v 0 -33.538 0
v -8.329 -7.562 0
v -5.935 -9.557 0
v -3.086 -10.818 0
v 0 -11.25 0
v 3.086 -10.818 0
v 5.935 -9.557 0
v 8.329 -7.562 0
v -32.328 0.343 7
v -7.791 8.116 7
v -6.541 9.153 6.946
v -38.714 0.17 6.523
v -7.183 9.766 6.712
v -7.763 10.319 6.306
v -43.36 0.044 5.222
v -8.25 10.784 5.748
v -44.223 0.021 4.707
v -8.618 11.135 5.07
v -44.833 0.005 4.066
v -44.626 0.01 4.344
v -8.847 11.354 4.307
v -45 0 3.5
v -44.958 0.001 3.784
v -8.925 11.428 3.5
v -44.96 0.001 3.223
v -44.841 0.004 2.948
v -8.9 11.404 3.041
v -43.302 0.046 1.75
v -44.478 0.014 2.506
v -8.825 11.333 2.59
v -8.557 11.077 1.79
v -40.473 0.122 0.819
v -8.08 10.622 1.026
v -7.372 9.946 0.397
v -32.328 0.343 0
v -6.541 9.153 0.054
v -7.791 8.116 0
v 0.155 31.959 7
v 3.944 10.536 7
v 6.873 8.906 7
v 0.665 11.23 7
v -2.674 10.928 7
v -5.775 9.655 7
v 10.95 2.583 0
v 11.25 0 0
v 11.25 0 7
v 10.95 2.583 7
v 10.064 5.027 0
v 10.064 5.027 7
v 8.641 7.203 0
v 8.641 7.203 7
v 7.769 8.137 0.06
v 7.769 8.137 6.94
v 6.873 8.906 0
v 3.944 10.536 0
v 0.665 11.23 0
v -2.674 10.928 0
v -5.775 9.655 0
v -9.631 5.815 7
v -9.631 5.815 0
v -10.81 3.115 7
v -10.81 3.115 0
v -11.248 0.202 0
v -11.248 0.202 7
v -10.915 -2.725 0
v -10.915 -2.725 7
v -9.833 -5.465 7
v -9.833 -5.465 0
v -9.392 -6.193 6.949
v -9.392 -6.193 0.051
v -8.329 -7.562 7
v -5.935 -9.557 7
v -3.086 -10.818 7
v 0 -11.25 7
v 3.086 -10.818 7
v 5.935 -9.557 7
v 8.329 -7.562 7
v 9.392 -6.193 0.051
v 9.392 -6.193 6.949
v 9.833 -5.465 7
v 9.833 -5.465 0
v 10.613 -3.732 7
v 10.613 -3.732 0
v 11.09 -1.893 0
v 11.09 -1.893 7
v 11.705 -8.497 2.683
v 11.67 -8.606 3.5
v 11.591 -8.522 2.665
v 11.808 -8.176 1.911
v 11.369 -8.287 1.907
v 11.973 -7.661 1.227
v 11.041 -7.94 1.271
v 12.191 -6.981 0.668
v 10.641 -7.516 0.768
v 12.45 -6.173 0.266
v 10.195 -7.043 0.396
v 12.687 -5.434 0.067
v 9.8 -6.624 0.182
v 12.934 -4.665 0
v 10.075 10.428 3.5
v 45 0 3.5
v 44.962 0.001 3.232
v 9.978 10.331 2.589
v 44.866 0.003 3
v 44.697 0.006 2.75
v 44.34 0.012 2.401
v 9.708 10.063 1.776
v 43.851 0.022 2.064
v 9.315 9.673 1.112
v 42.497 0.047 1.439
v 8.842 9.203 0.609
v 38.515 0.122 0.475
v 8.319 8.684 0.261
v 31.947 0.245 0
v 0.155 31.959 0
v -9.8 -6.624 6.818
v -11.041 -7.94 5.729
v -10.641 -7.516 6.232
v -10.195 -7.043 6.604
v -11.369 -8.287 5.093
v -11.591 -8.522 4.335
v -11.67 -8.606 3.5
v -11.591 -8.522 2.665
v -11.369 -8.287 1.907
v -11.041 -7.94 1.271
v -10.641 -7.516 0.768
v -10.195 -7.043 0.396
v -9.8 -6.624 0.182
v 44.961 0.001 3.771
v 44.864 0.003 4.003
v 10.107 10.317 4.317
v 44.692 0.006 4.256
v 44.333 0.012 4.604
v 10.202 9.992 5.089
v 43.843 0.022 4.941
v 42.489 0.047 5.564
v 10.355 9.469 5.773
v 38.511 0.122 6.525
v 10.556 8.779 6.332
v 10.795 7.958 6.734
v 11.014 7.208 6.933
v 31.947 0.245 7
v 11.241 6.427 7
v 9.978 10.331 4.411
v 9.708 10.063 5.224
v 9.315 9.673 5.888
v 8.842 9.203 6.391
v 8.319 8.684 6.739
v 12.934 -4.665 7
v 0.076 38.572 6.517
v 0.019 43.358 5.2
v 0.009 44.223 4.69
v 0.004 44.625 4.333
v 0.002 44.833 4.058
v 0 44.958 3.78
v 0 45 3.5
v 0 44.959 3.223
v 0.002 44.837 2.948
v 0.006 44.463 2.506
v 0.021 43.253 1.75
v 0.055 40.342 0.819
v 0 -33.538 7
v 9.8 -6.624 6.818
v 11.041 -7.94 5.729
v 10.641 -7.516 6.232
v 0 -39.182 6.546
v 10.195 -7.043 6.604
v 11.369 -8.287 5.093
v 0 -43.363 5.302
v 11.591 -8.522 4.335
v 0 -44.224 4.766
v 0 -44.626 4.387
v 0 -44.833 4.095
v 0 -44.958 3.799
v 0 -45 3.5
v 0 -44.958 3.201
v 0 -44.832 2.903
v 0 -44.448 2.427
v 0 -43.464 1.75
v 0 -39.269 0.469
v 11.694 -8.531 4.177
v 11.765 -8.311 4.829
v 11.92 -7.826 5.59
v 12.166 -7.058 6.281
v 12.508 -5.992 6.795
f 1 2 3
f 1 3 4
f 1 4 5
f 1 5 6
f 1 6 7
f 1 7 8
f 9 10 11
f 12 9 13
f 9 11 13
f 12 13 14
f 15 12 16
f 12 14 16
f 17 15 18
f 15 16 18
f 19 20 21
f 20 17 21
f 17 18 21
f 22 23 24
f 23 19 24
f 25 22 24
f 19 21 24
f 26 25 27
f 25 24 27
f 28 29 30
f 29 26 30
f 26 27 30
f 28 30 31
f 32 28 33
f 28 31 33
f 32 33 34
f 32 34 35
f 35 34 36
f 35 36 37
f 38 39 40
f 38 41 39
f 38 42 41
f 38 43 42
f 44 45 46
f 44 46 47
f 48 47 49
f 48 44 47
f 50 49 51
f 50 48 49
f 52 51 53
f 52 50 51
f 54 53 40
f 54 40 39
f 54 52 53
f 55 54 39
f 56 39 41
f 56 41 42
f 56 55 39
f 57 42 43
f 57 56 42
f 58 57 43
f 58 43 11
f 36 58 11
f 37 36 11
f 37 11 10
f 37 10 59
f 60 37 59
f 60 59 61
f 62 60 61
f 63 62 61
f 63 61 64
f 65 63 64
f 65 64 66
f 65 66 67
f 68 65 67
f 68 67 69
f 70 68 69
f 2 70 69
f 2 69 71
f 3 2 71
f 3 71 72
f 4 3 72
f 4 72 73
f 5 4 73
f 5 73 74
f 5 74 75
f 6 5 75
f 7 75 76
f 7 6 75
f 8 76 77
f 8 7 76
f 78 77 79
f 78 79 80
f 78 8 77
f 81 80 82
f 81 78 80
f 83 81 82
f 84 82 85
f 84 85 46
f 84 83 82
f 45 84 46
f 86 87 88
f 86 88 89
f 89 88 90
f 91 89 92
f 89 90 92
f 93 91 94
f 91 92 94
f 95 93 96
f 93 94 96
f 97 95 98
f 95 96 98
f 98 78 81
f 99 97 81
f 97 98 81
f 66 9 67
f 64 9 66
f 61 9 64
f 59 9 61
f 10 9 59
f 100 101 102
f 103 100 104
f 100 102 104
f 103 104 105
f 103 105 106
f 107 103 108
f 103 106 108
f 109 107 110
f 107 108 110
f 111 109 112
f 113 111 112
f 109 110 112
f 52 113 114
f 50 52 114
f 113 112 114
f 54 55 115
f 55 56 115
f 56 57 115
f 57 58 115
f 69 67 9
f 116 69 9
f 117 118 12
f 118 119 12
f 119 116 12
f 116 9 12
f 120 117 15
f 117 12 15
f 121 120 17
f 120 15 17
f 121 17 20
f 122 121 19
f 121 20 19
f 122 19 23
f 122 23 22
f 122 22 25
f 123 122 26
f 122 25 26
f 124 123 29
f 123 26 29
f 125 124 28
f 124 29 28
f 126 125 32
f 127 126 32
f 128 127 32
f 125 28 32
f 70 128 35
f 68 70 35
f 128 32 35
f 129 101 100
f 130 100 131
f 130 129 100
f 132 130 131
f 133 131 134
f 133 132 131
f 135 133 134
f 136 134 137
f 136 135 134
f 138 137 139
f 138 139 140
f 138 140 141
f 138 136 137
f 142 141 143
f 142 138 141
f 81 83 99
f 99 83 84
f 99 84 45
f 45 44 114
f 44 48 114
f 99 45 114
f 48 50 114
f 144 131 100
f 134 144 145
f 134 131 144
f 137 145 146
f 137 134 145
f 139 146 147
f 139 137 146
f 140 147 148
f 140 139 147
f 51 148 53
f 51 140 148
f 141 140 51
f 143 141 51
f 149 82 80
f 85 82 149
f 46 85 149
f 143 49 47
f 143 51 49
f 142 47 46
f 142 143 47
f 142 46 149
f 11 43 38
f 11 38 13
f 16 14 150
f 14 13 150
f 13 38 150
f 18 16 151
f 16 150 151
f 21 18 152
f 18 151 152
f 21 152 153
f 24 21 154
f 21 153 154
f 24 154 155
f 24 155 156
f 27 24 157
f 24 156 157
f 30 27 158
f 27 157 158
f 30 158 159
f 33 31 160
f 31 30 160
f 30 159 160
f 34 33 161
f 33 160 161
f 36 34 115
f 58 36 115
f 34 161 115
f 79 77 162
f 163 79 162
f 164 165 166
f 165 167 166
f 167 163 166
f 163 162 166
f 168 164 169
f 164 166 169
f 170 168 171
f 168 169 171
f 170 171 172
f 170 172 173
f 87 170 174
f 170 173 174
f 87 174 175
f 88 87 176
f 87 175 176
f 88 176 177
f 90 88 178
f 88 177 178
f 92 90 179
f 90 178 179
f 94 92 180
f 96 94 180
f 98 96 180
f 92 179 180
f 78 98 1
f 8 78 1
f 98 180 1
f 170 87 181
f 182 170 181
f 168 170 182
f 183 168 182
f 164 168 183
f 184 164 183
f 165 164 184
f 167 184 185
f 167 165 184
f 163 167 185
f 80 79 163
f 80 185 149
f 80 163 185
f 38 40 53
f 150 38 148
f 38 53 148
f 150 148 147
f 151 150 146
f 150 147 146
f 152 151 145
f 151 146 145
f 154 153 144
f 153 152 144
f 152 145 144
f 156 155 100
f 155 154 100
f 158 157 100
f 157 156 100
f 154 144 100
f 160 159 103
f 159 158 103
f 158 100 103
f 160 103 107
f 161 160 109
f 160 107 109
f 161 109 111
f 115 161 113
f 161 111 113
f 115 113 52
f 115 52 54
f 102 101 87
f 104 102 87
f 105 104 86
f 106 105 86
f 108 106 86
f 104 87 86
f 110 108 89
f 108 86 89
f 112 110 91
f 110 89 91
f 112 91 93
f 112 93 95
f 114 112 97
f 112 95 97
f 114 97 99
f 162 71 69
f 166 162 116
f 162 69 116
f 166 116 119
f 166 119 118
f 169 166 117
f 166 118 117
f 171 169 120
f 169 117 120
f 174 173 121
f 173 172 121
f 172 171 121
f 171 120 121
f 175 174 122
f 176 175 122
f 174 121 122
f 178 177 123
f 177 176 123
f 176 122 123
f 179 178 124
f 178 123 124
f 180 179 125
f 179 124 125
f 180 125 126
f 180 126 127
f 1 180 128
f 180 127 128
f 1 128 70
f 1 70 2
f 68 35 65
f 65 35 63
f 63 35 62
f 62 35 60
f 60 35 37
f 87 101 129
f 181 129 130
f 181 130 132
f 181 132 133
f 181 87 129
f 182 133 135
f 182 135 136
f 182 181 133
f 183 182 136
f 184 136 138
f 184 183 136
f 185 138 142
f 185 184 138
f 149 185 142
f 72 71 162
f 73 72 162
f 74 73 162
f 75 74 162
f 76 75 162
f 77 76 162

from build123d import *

# Parameters (mm, degrees)
F0_R         = 11.25
F1_DEPTH     = 7
F2_T4_DEPTH  = 53.5102509631
F2_T9_DEPTH  = 52.2381371755
F2_T14_DEPTH = 55.3419579342
F2_T19_DEPTH = 51.9229754131
F2_T24_DEPTH = 55.7195375849
F2_T29_DEPTH = 55.7195375849
F2_T34_DEPTH = 51.9229754131
F2_T39_DEPTH = 53.9484048993
F2_T45_DEPTH = 53.9484048993
F2_T49_DEPTH = 53.5102509631
F2_T56_DEPTH = 52.2381371755
F2_T60_DEPTH = 55.3419579342
F2_T67_DEPTH = 55.7195375849
F2_T71_DEPTH = 51.9229754131
F2_T78_DEPTH = 55.7195375849
F2_T82_DEPTH = 51.9229754131
F3_T4_DEPTH  = 53.5102509631
F3_T9_DEPTH  = 53.9484048993
F3_T14_DEPTH = 51.9229754131
F3_T19_DEPTH = 55.7195375849
F3_T24_DEPTH = 55.7195375849
F3_T29_DEPTH = 51.9229754131
F3_T34_DEPTH = 55.3419579342
F3_T39_DEPTH = 52.2381371755
F3_T45_DEPTH = 53.5102509631
F3_T49_DEPTH = 53.9484048993
F3_T56_DEPTH = 51.9229754131
F3_T60_DEPTH = 55.7195375849
F3_T67_DEPTH = 55.7195375849
F3_T71_DEPTH = 51.9229754131
F3_T78_DEPTH = 55.3419579342
F3_T82_DEPTH = 52.2381371755


# Not quite as in the source:
# - a fillet or chamfer that OpenCascade refuses, or shapes differently, is made with other operations: its cross-section is extruded or revolved along the edge and cut away or added


with BuildPart() as f1:
    # F0 (on Top) → F1 (new body)
    with BuildSketch(Plane.XY):
        with BuildLine():
            ThreePointArc((11.6700973746, -8.6057438533), (13.7743677156, -4.5295467802), (14.5, 0))
            ThreePointArc((14.5, 0), (13.3480283218, 5.6639332553), (10.0751531144, 10.4279091731))
            ThreePointArc((10.0751531144, 10.4279091731), (0.7621030803, 14.4799585253), (-8.9248468856, 11.4279091731))
            ThreePointArc((-8.9248468856, 11.4279091731), (-14.3657490464, 1.9685665686), (-11.6700973746, -8.6057438533))
            ThreePointArc((-11.6700973746, -8.6057438533), (0, -14.5), (11.6700973746, -8.6057438533))
        make_face()
        Circle(F0_R, mode=Mode.SUBTRACT)
        with BuildLine():
            ThreePointArc((10.0751531144, 10.4279091731), (13.3480283218, 5.6639332553), (14.5, 0))
            ThreePointArc((14.5, 0), (13.7743677156, -4.5295467802), (11.6700973746, -8.6057438533))
            Line((11.6700973746, -8.6057438533), (45, 0))
            Line((45, 0), (10.0751531144, 10.4279091731))
        make_face()
        with BuildLine():
            ThreePointArc((-8.9248468856, 11.4279091731), (0.7621030803, 14.4799585253), (10.0751531144, 10.4279091731))
            Line((10.0751531144, 10.4279091731), (0, 45))
            Line((0, 45), (-8.9248468856, 11.4279091731))
        make_face()
        with BuildLine():
            Line((0, -45), (11.6700973746, -8.6057438533))
            ThreePointArc((11.6700973746, -8.6057438533), (0, -14.5), (-11.6700973746, -8.6057438533))
            Line((-11.6700973746, -8.6057438533), (0, -45))
        make_face()
        with BuildLine():
            ThreePointArc((-11.6700973746, -8.6057438533), (-14.3657490464, 1.9685665686), (-8.9248468856, 11.4279091731))
            Line((-8.9248468856, 11.4279091731), (-45, 0))
            Line((-45, 0), (-11.6700973746, -8.6057438533))
        make_face()
    extrude(amount=F1_DEPTH)

    # F2: fillet of radius 3.5 on 8 edges, made by hand


with BuildPart() as f2_tool2:
    # F2_s3 → F2_t4 (new body)
    with BuildSketch(Plane(origin=(0.4357492619, -1.4952391183, 0), x_dir=(0, 0, 1), z_dir=(-0.2797856956, 0.9600624795, 0))):
        with BuildLine():
            ThreePointArc((3.5, 12.5903563019), (5.9748737342, 11.5652300361), (7, 9.0903563019))
            Line((7, 9.0903563019), (7, 12.5903563019))
            Line((7, 12.5903563019), (3.5, 12.5903563019))
        make_face()
    extrude(amount=F2_T4_DEPTH)

    split(bisect_by=Plane(origin=(3.6834089544, 12.3363650004, 0), x_dir=(0, 0, 1), z_dir=(0.2861005633, 0.958199597, 0)), keep=Keep.TOP)


with BuildPart() as f1_1:
    add(f1.part)

    # F2_t1: cut F2_tool2
    add(f2_tool2.part, mode=Mode.SUBTRACT)


with BuildPart() as f2_tool7:
    # F2_s8 → F2_t9 (new body)
    with BuildSketch(Plane(origin=(13.4212581193, 50.4859861874, 0), x_dir=(0, 0, 1), z_dir=(-0.2569178318, -0.9664332505, 0))):
        with BuildLine():
            ThreePointArc((3.5, 11.5613024332), (5.9748737342, 10.5361761674), (7, 8.0613024332))
            Line((7, 8.0613024332), (7, 11.5613024332))
            Line((7, 11.5613024332), (3.5, 11.5613024332))
        make_face()
    extrude(amount=F2_T9_DEPTH)

    split(bisect_by=Plane(origin=(-4.1039199091, 12.9550853833, 0), x_dir=(0, 0, 1), z_dir=(-0.3019904306, 0.9533109565, 0)), keep=Keep.TOP)


with BuildPart() as f1_2:
    add(f1_1.part)

    # F2_t6: cut F2_tool7
    add(f2_tool7.part, mode=Mode.SUBTRACT)


with BuildPart() as f2_tool12:
    # F2_s13 → F2_t14 (new body)
    with BuildSketch(Plane(origin=(3.5205438929, 1.1152400579, 0), x_dir=(0, 0, 1), z_dir=(-0.9533109565, -0.3019904306, 0))):
        with BuildLine():
            ThreePointArc((3.5, 13.5895693791), (5.9748737342, 12.5644431133), (7, 10.0895693791))
            Line((7, 10.0895693791), (7, 13.5895693791))
            Line((7, 13.5895693791), (3.5, 13.5895693791))
        make_face()
    extrude(amount=F2_T14_DEPTH)

    split(bisect_by=Plane(origin=(-11.1732270906, 2.9703047545, 0), x_dir=(0, 0, 1), z_dir=(-0.9664332505, 0.2569178318, 0)), keep=Keep.TOP)


with BuildPart() as f1_3:
    add(f1_2.part)

    # F2_t11: cut F2_tool12
    add(f2_tool12.part, mode=Mode.SUBTRACT)


with BuildPart() as f2_tool17:
    # F2_s18 → F2_t19 (new body)
    with BuildSketch(Plane(origin=(-50.6596510698, 13.0802656612, 0), x_dir=(0, 0, 1), z_dir=(0.9682458366, -0.25, 0))):
        with BuildLine():
            ThreePointArc((3.5, 11.25), (5.9748737342, 10.2248737342), (7, 7.75))
            Line((7, 7.75), (7, 11.25))
            Line((7, 11.25), (3.5, 11.25))
        make_face()
    extrude(amount=F2_T19_DEPTH)

    split(bisect_by=Plane(origin=(-13.0842545446, -4.1955665749, 0), x_dir=(0, 0, 1), z_dir=(-0.9522421894, -0.3053437616, 0)), keep=Keep.TOP)


with BuildPart() as f1_4:
    add(f1_3.part)

    # F2_t16: cut F2_tool17
    add(f2_tool17.part, mode=Mode.SUBTRACT)


with BuildPart() as f2_tool22:
    # F2_s23 → F2_t24 (new body)
    with BuildSketch(Plane(origin=(-1.2576007444, 3.9219418787, 0), x_dir=(0, 0, 1), z_dir=(0.3053437616, -0.9522421894, 0))):
        with BuildLine():
            ThreePointArc((3.5, 13.7404692741), (5.9748737342, 12.7153430082), (7, 10.2404692741))
            Line((7, 10.2404692741), (7, 13.7404692741))
            Line((7, 13.7404692741), (3.5, 13.7404692741))
        make_face()
    extrude(amount=F2_T24_DEPTH)

    split(bisect_by=Plane(origin=(-2.8125, -10.8927656612, 0), x_dir=(0, 0, 1), z_dir=(-0.25, -0.9682458366, 0)), keep=Keep.TOP)


with BuildPart() as f1_5:
    add(f1_4.part)

    # F2_t21: cut F2_tool22
    add(f2_tool22.part, mode=Mode.SUBTRACT)


with BuildPart() as f2_tool27:
    # F2_s28 → F2_t29 (new body)
    with BuildSketch(Plane(origin=(-15.756012459, -49.1365525821, 0), x_dir=(0, 0, 1), z_dir=(0.3053437616, 0.9522421894, 0))):
        with BuildLine():
            ThreePointArc((3.5, 13.7404692741), (5.9748737342, 12.7153430082), (7, 10.2404692741))
            Line((7, 10.2404692741), (7, 13.7404692741))
            Line((7, 13.7404692741), (3.5, 13.7404692741))
        make_face()
    extrude(amount=F2_T29_DEPTH)

    split(bisect_by=Plane(origin=(2.8125, -10.8927656612, 0), x_dir=(0, 0, 1), z_dir=(0.25, -0.9682458366, 0)), keep=Keep.TOP)


with BuildPart() as f1_6:
    add(f1_5.part)

    # F2_t26: cut F2_tool27
    add(f2_tool27.part, mode=Mode.SUBTRACT)


with BuildPart() as f2_tool32:
    # F2_s33 → F2_t34 (new body)
    with BuildSketch(Plane(origin=(0.3854463047, 0.0995218079, 0), x_dir=(0, 0, 1), z_dir=(0.9682458366, 0.25, 0))):
        with BuildLine():
            ThreePointArc((3.5, 11.25), (5.9748737342, 10.2248737342), (7, 7.75))
            Line((7, 7.75), (7, 11.25))
            Line((7, 11.25), (3.5, 11.25))
        make_face()
    extrude(amount=F2_T34_DEPTH)

    split(bisect_by=Plane(origin=(13.0842545446, -4.1955665749, 0), x_dir=(0, 0, 1), z_dir=(0.9522421894, -0.3053437616, 0)), keep=Keep.TOP)


with BuildPart() as f1_7:
    add(f1_6.part)

    # F2_t31: cut F2_tool32
    add(f2_tool32.part, mode=Mode.SUBTRACT)


with BuildPart() as f2_tool37:
    # F2_s38 → F2_t39 (new body)
    with BuildSketch(Plane(origin=(49.7008375193, -14.8397449293, 0), x_dir=(0, 0, 1), z_dir=(-0.958199597, 0.2861005633, 0))):
        with BuildLine():
            ThreePointArc((3.5, 12.8745253485), (5.9748737342, 11.8493990826), (7, 9.3745253485))
            Line((7, 9.3745253485), (7, 12.8745253485))
            Line((7, 12.8745253485), (3.5, 12.8745253485))
        make_face()
    extrude(amount=F2_T39_DEPTH)

    split(bisect_by=Plane(origin=(12.087528689, 3.5226015958, 0), x_dir=(0, 0, 1), z_dir=(0.9600624795, 0.2797856956, 0)), keep=Keep.TOP)


with BuildPart() as f1_8:
    add(f1_7.part)

    # F2_t36: cut F2_tool37
    add(f2_tool37.part, mode=Mode.SUBTRACT)


with BuildPart() as f2_tool43:
    # F2_s44 → F2_t45 (new body)
    with BuildSketch(Plane(origin=(49.7008375193, -14.8397449293, 0), x_dir=(0, 0, 1), z_dir=(-0.958199597, 0.2861005633, 0))):
        with BuildLine():
            ThreePointArc((3.5, 12.8745253485), (5.9748737342, 11.8493990826), (7, 9.3745253485))
            Line((7, 9.3745253485), (7, 12.8745253485))
            Line((7, 12.8745253485), (3.5, 12.8745253485))
        make_face()
    extrude(amount=F2_T45_DEPTH)

    split(bisect_by=Plane(origin=(12.087528689, 3.5226015958, 0), x_dir=(0, 0, 1), z_dir=(-0.9600624795, -0.2797856956, 0)), keep=Keep.TOP)


with BuildPart() as f2_tool47:
    # F2_s48 → F2_t49 (new body)
    with BuildSketch(Plane(origin=(0.4357492619, -1.4952391183, 0), x_dir=(0, 0, 1), z_dir=(-0.2797856956, 0.9600624795, 0))):
        with BuildLine():
            ThreePointArc((3.5, 12.5903563019), (5.9748737342, 11.5652300361), (7, 9.0903563019))
            Line((7, 9.0903563019), (7, 12.5903563019))
            Line((7, 12.5903563019), (3.5, 12.5903563019))
        make_face()
    extrude(amount=F2_T49_DEPTH)

    split(bisect_by=Plane(origin=(3.6834089544, 12.3363650004, 0), x_dir=(0, 0, 1), z_dir=(-0.2861005633, -0.958199597, 0)), keep=Keep.TOP)


with BuildPart() as f2_tool43_1:
    add(f2_tool43.part)

    # F2_t51: intersect F2_tool47
    add(f2_tool47.part, mode=Mode.INTERSECT)


with BuildPart() as f1_9:
    add(f1_8.part)

    # F2_t41: cut F2_tool43
    add(f2_tool43_1.part, mode=Mode.SUBTRACT)


with BuildPart() as f2_tool54:
    # F2_s55 → F2_t56 (new body)
    with BuildSketch(Plane(origin=(13.4212581193, 50.4859861874, 0), x_dir=(0, 0, 1), z_dir=(-0.2569178318, -0.9664332505, 0))):
        with BuildLine():
            ThreePointArc((3.5, 11.5613024332), (5.9748737342, 10.5361761674), (7, 8.0613024332))
            Line((7, 8.0613024332), (7, 11.5613024332))
            Line((7, 11.5613024332), (3.5, 11.5613024332))
        make_face()
    extrude(amount=F2_T56_DEPTH)

    split(bisect_by=Plane(origin=(-4.1039199091, 12.9550853833, 0), x_dir=(0, 0, 1), z_dir=(0.3019904306, -0.9533109565, 0)), keep=Keep.TOP)


with BuildPart() as f2_tool58:
    # F2_s59 → F2_t60 (new body)
    with BuildSketch(Plane(origin=(3.5205438929, 1.1152400579, 0), x_dir=(0, 0, 1), z_dir=(-0.9533109565, -0.3019904306, 0))):
        with BuildLine():
            ThreePointArc((3.5, 13.5895693791), (5.9748737342, 12.5644431133), (7, 10.0895693791))
            Line((7, 10.0895693791), (7, 13.5895693791))
            Line((7, 13.5895693791), (3.5, 13.5895693791))
        make_face()
    extrude(amount=F2_T60_DEPTH)

    split(bisect_by=Plane(origin=(-11.1732270906, 2.9703047545, 0), x_dir=(0, 0, 1), z_dir=(0.9664332505, -0.2569178318, 0)), keep=Keep.TOP)


with BuildPart() as f2_tool54_1:
    add(f2_tool54.part)

    # F2_t62: intersect F2_tool58
    add(f2_tool58.part, mode=Mode.INTERSECT)


with BuildPart() as f1_10:
    add(f1_9.part)

    # F2_t52: cut F2_tool54
    add(f2_tool54_1.part, mode=Mode.SUBTRACT)


with BuildPart() as f2_tool65:
    # F2_s66 → F2_t67 (new body)
    with BuildSketch(Plane(origin=(-1.2576007444, 3.9219418787, 0), x_dir=(0, 0, 1), z_dir=(0.3053437616, -0.9522421894, 0))):
        with BuildLine():
            ThreePointArc((3.5, 13.7404692741), (5.9748737342, 12.7153430082), (7, 10.2404692741))
            Line((7, 10.2404692741), (7, 13.7404692741))
            Line((7, 13.7404692741), (3.5, 13.7404692741))
        make_face()
    extrude(amount=F2_T67_DEPTH)

    split(bisect_by=Plane(origin=(-2.8125, -10.8927656612, 0), x_dir=(0, 0, 1), z_dir=(0.25, 0.9682458366, 0)), keep=Keep.TOP)


with BuildPart() as f2_tool69:
    # F2_s70 → F2_t71 (new body)
    with BuildSketch(Plane(origin=(-50.6596510698, 13.0802656612, 0), x_dir=(0, 0, 1), z_dir=(0.9682458366, -0.25, 0))):
        with BuildLine():
            ThreePointArc((3.5, 11.25), (5.9748737342, 10.2248737342), (7, 7.75))
            Line((7, 7.75), (7, 11.25))
            Line((7, 11.25), (3.5, 11.25))
        make_face()
    extrude(amount=F2_T71_DEPTH)

    split(bisect_by=Plane(origin=(-13.0842545446, -4.1955665749, 0), x_dir=(0, 0, 1), z_dir=(0.9522421894, 0.3053437616, 0)), keep=Keep.TOP)


with BuildPart() as f2_tool65_1:
    add(f2_tool65.part)

    # F2_t73: intersect F2_tool69
    add(f2_tool69.part, mode=Mode.INTERSECT)


with BuildPart() as f1_11:
    add(f1_10.part)

    # F2_t63: cut F2_tool65
    add(f2_tool65_1.part, mode=Mode.SUBTRACT)


with BuildPart() as f2_tool76:
    # F2_s77 → F2_t78 (new body)
    with BuildSketch(Plane(origin=(-15.756012459, -49.1365525821, 0), x_dir=(0, 0, 1), z_dir=(0.3053437616, 0.9522421894, 0))):
        with BuildLine():
            ThreePointArc((3.5, 13.7404692741), (5.9748737342, 12.7153430082), (7, 10.2404692741))
            Line((7, 10.2404692741), (7, 13.7404692741))
            Line((7, 13.7404692741), (3.5, 13.7404692741))
        make_face()
    extrude(amount=F2_T78_DEPTH)

    split(bisect_by=Plane(origin=(2.8125, -10.8927656612, 0), x_dir=(0, 0, 1), z_dir=(-0.25, 0.9682458366, 0)), keep=Keep.TOP)


with BuildPart() as f2_tool80:
    # F2_s81 → F2_t82 (new body)
    with BuildSketch(Plane(origin=(0.3854463047, 0.0995218079, 0), x_dir=(0, 0, 1), z_dir=(0.9682458366, 0.25, 0))):
        with BuildLine():
            ThreePointArc((3.5, 11.25), (5.9748737342, 10.2248737342), (7, 7.75))
            Line((7, 7.75), (7, 11.25))
            Line((7, 11.25), (3.5, 11.25))
        make_face()
    extrude(amount=F2_T82_DEPTH)

    split(bisect_by=Plane(origin=(13.0842545446, -4.1955665749, 0), x_dir=(0, 0, 1), z_dir=(-0.9522421894, 0.3053437616, 0)), keep=Keep.TOP)


with BuildPart() as f2_tool76_1:
    add(f2_tool76.part)

    # F2_t84: intersect F2_tool80
    add(f2_tool80.part, mode=Mode.INTERSECT)


with BuildPart() as f1_12:
    add(f1_11.part)

    # F2_t74: cut F2_tool76
    add(f2_tool76_1.part, mode=Mode.SUBTRACT)

    # F3: fillet of radius 3.5 on 8 edges, made by hand


with BuildPart() as f3_tool2:
    # F3_s3 → F3_t4 (new body)
    with BuildSketch(Plane(origin=(0.4357492619, -1.4952391183, 0), x_dir=(0, 0, 1), z_dir=(-0.2797856956, 0.9600624795, 0))):
        with BuildLine():
            ThreePointArc((3.5, 12.5903563019), (1.0251262658, 11.5652300361), (0, 9.0903563019))
            Line((0, 9.0903563019), (0, 12.5903563019))
            Line((0, 12.5903563019), (3.5, 12.5903563019))
        make_face()
    extrude(amount=F3_T4_DEPTH)

    split(bisect_by=Plane(origin=(3.6834089544, 12.3363650004, 0), x_dir=(0, 0, 1), z_dir=(0.2861005633, 0.958199597, 0)), keep=Keep.TOP)


with BuildPart() as f1_13:
    add(f1_12.part)

    # F3_t1: cut F3_tool2
    add(f3_tool2.part, mode=Mode.SUBTRACT)


with BuildPart() as f3_tool7:
    # F3_s8 → F3_t9 (new body)
    with BuildSketch(Plane(origin=(49.7008375193, -14.8397449293, 0), x_dir=(0, 0, 1), z_dir=(-0.958199597, 0.2861005633, 0))):
        with BuildLine():
            ThreePointArc((3.5, 12.8745253485), (1.0251262658, 11.8493990826), (0, 9.3745253485))
            Line((0, 9.3745253485), (0, 12.8745253485))
            Line((0, 12.8745253485), (3.5, 12.8745253485))
        make_face()
    extrude(amount=F3_T9_DEPTH)

    split(bisect_by=Plane(origin=(12.087528689, 3.5226015958, 0), x_dir=(0, 0, 1), z_dir=(0.9600624795, 0.2797856956, 0)), keep=Keep.TOP)


with BuildPart() as f1_14:
    add(f1_13.part)

    # F3_t6: cut F3_tool7
    add(f3_tool7.part, mode=Mode.SUBTRACT)


with BuildPart() as f3_tool12:
    # F3_s13 → F3_t14 (new body)
    with BuildSketch(Plane(origin=(0.3854463047, 0.0995218079, 0), x_dir=(0, 0, 1), z_dir=(0.9682458366, 0.25, 0))):
        with BuildLine():
            ThreePointArc((3.5, 11.25), (1.0251262658, 10.2248737342), (0, 7.75))
            Line((0, 7.75), (0, 11.25))
            Line((0, 11.25), (3.5, 11.25))
        make_face()
    extrude(amount=F3_T14_DEPTH)

    split(bisect_by=Plane(origin=(13.0842545446, -4.1955665749, 0), x_dir=(0, 0, 1), z_dir=(0.9522421894, -0.3053437616, 0)), keep=Keep.TOP)


with BuildPart() as f1_15:
    add(f1_14.part)

    # F3_t11: cut F3_tool12
    add(f3_tool12.part, mode=Mode.SUBTRACT)


with BuildPart() as f3_tool17:
    # F3_s18 → F3_t19 (new body)
    with BuildSketch(Plane(origin=(-15.756012459, -49.1365525821, 0), x_dir=(0, 0, 1), z_dir=(0.3053437616, 0.9522421894, 0))):
        with BuildLine():
            ThreePointArc((3.5, 13.7404692741), (1.0251262658, 12.7153430082), (0, 10.2404692741))
            Line((0, 10.2404692741), (0, 13.7404692741))
            Line((0, 13.7404692741), (3.5, 13.7404692741))
        make_face()
    extrude(amount=F3_T19_DEPTH)

    split(bisect_by=Plane(origin=(2.8125, -10.8927656612, 0), x_dir=(0, 0, 1), z_dir=(0.25, -0.9682458366, 0)), keep=Keep.TOP)


with BuildPart() as f1_16:
    add(f1_15.part)

    # F3_t16: cut F3_tool17
    add(f3_tool17.part, mode=Mode.SUBTRACT)


with BuildPart() as f3_tool22:
    # F3_s23 → F3_t24 (new body)
    with BuildSketch(Plane(origin=(-1.2576007444, 3.9219418787, 0), x_dir=(0, 0, 1), z_dir=(0.3053437616, -0.9522421894, 0))):
        with BuildLine():
            ThreePointArc((3.5, 13.7404692741), (1.0251262658, 12.7153430082), (0, 10.2404692741))
            Line((0, 10.2404692741), (0, 13.7404692741))
            Line((0, 13.7404692741), (3.5, 13.7404692741))
        make_face()
    extrude(amount=F3_T24_DEPTH)

    split(bisect_by=Plane(origin=(-2.8125, -10.8927656612, 0), x_dir=(0, 0, 1), z_dir=(-0.25, -0.9682458366, 0)), keep=Keep.TOP)


with BuildPart() as f1_17:
    add(f1_16.part)

    # F3_t21: cut F3_tool22
    add(f3_tool22.part, mode=Mode.SUBTRACT)


with BuildPart() as f3_tool27:
    # F3_s28 → F3_t29 (new body)
    with BuildSketch(Plane(origin=(-50.6596510698, 13.0802656612, 0), x_dir=(0, 0, 1), z_dir=(0.9682458366, -0.25, 0))):
        with BuildLine():
            ThreePointArc((3.5, 11.25), (1.0251262658, 10.2248737342), (0, 7.75))
            Line((0, 7.75), (0, 11.25))
            Line((0, 11.25), (3.5, 11.25))
        make_face()
    extrude(amount=F3_T29_DEPTH)

    split(bisect_by=Plane(origin=(-13.0842545446, -4.1955665749, 0), x_dir=(0, 0, 1), z_dir=(-0.9522421894, -0.3053437616, 0)), keep=Keep.TOP)


with BuildPart() as f1_18:
    add(f1_17.part)

    # F3_t26: cut F3_tool27
    add(f3_tool27.part, mode=Mode.SUBTRACT)


with BuildPart() as f3_tool32:
    # F3_s33 → F3_t34 (new body)
    with BuildSketch(Plane(origin=(3.5205438929, 1.1152400579, 0), x_dir=(0, 0, 1), z_dir=(-0.9533109565, -0.3019904306, 0))):
        with BuildLine():
            ThreePointArc((3.5, 13.5895693791), (1.0251262658, 12.5644431133), (0, 10.0895693791))
            Line((0, 10.0895693791), (0, 13.5895693791))
            Line((0, 13.5895693791), (3.5, 13.5895693791))
        make_face()
    extrude(amount=F3_T34_DEPTH)

    split(bisect_by=Plane(origin=(-11.1732270906, 2.9703047545, 0), x_dir=(0, 0, 1), z_dir=(-0.9664332505, 0.2569178318, 0)), keep=Keep.TOP)


with BuildPart() as f1_19:
    add(f1_18.part)

    # F3_t31: cut F3_tool32
    add(f3_tool32.part, mode=Mode.SUBTRACT)


with BuildPart() as f3_tool37:
    # F3_s38 → F3_t39 (new body)
    with BuildSketch(Plane(origin=(13.4212581193, 50.4859861874, 0), x_dir=(0, 0, 1), z_dir=(-0.2569178318, -0.9664332505, 0))):
        with BuildLine():
            ThreePointArc((3.5, 11.5613024332), (1.0251262658, 10.5361761674), (0, 8.0613024332))
            Line((0, 8.0613024332), (0, 11.5613024332))
            Line((0, 11.5613024332), (3.5, 11.5613024332))
        make_face()
    extrude(amount=F3_T39_DEPTH)

    split(bisect_by=Plane(origin=(-4.1039199091, 12.9550853833, 0), x_dir=(0, 0, 1), z_dir=(-0.3019904306, 0.9533109565, 0)), keep=Keep.TOP)


with BuildPart() as f1_20:
    add(f1_19.part)

    # F3_t36: cut F3_tool37
    add(f3_tool37.part, mode=Mode.SUBTRACT)


with BuildPart() as f3_tool43:
    # F3_s44 → F3_t45 (new body)
    with BuildSketch(Plane(origin=(0.4357492619, -1.4952391183, 0), x_dir=(0, 0, 1), z_dir=(-0.2797856956, 0.9600624795, 0))):
        with BuildLine():
            ThreePointArc((3.5, 12.5903563019), (1.0251262658, 11.5652300361), (0, 9.0903563019))
            Line((0, 9.0903563019), (0, 12.5903563019))
            Line((0, 12.5903563019), (3.5, 12.5903563019))
        make_face()
    extrude(amount=F3_T45_DEPTH)

    split(bisect_by=Plane(origin=(3.6834089544, 12.3363650004, 0), x_dir=(0, 0, 1), z_dir=(-0.2861005633, -0.958199597, 0)), keep=Keep.TOP)


with BuildPart() as f3_tool47:
    # F3_s48 → F3_t49 (new body)
    with BuildSketch(Plane(origin=(49.7008375193, -14.8397449293, 0), x_dir=(0, 0, 1), z_dir=(-0.958199597, 0.2861005633, 0))):
        with BuildLine():
            ThreePointArc((3.5, 12.8745253485), (1.0251262658, 11.8493990826), (0, 9.3745253485))
            Line((0, 9.3745253485), (0, 12.8745253485))
            Line((0, 12.8745253485), (3.5, 12.8745253485))
        make_face()
    extrude(amount=F3_T49_DEPTH)

    split(bisect_by=Plane(origin=(12.087528689, 3.5226015958, 0), x_dir=(0, 0, 1), z_dir=(-0.9600624795, -0.2797856956, 0)), keep=Keep.TOP)


with BuildPart() as f3_tool43_1:
    add(f3_tool43.part)

    # F3_t51: intersect F3_tool47
    add(f3_tool47.part, mode=Mode.INTERSECT)


with BuildPart() as f1_21:
    add(f1_20.part)

    # F3_t41: cut F3_tool43
    add(f3_tool43_1.part, mode=Mode.SUBTRACT)


with BuildPart() as f3_tool54:
    # F3_s55 → F3_t56 (new body)
    with BuildSketch(Plane(origin=(0.3854463047, 0.0995218079, 0), x_dir=(0, 0, 1), z_dir=(0.9682458366, 0.25, 0))):
        with BuildLine():
            ThreePointArc((3.5, 11.25), (1.0251262658, 10.2248737342), (0, 7.75))
            Line((0, 7.75), (0, 11.25))
            Line((0, 11.25), (3.5, 11.25))
        make_face()
    extrude(amount=F3_T56_DEPTH)

    split(bisect_by=Plane(origin=(13.0842545446, -4.1955665749, 0), x_dir=(0, 0, 1), z_dir=(-0.9522421894, 0.3053437616, 0)), keep=Keep.TOP)


with BuildPart() as f3_tool58:
    # F3_s59 → F3_t60 (new body)
    with BuildSketch(Plane(origin=(-15.756012459, -49.1365525821, 0), x_dir=(0, 0, 1), z_dir=(0.3053437616, 0.9522421894, 0))):
        with BuildLine():
            ThreePointArc((3.5, 13.7404692741), (1.0251262658, 12.7153430082), (0, 10.2404692741))
            Line((0, 10.2404692741), (0, 13.7404692741))
            Line((0, 13.7404692741), (3.5, 13.7404692741))
        make_face()
    extrude(amount=F3_T60_DEPTH)

    split(bisect_by=Plane(origin=(2.8125, -10.8927656612, 0), x_dir=(0, 0, 1), z_dir=(-0.25, 0.9682458366, 0)), keep=Keep.TOP)


with BuildPart() as f3_tool54_1:
    add(f3_tool54.part)

    # F3_t62: intersect F3_tool58
    add(f3_tool58.part, mode=Mode.INTERSECT)


with BuildPart() as f1_22:
    add(f1_21.part)

    # F3_t52: cut F3_tool54
    add(f3_tool54_1.part, mode=Mode.SUBTRACT)


with BuildPart() as f3_tool65:
    # F3_s66 → F3_t67 (new body)
    with BuildSketch(Plane(origin=(-1.2576007444, 3.9219418787, 0), x_dir=(0, 0, 1), z_dir=(0.3053437616, -0.9522421894, 0))):
        with BuildLine():
            ThreePointArc((3.5, 13.7404692741), (1.0251262658, 12.7153430082), (0, 10.2404692741))
            Line((0, 10.2404692741), (0, 13.7404692741))
            Line((0, 13.7404692741), (3.5, 13.7404692741))
        make_face()
    extrude(amount=F3_T67_DEPTH)

    split(bisect_by=Plane(origin=(-2.8125, -10.8927656612, 0), x_dir=(0, 0, 1), z_dir=(0.25, 0.9682458366, 0)), keep=Keep.TOP)


with BuildPart() as f3_tool69:
    # F3_s70 → F3_t71 (new body)
    with BuildSketch(Plane(origin=(-50.6596510698, 13.0802656612, 0), x_dir=(0, 0, 1), z_dir=(0.9682458366, -0.25, 0))):
        with BuildLine():
            ThreePointArc((3.5, 11.25), (1.0251262658, 10.2248737342), (0, 7.75))
            Line((0, 7.75), (0, 11.25))
            Line((0, 11.25), (3.5, 11.25))
        make_face()
    extrude(amount=F3_T71_DEPTH)

    split(bisect_by=Plane(origin=(-13.0842545446, -4.1955665749, 0), x_dir=(0, 0, 1), z_dir=(0.9522421894, 0.3053437616, 0)), keep=Keep.TOP)


with BuildPart() as f3_tool65_1:
    add(f3_tool65.part)

    # F3_t73: intersect F3_tool69
    add(f3_tool69.part, mode=Mode.INTERSECT)


with BuildPart() as f1_23:
    add(f1_22.part)

    # F3_t63: cut F3_tool65
    add(f3_tool65_1.part, mode=Mode.SUBTRACT)


with BuildPart() as f3_tool76:
    # F3_s77 → F3_t78 (new body)
    with BuildSketch(Plane(origin=(3.5205438929, 1.1152400579, 0), x_dir=(0, 0, 1), z_dir=(-0.9533109565, -0.3019904306, 0))):
        with BuildLine():
            ThreePointArc((3.5, 13.5895693791), (1.0251262658, 12.5644431133), (0, 10.0895693791))
            Line((0, 10.0895693791), (0, 13.5895693791))
            Line((0, 13.5895693791), (3.5, 13.5895693791))
        make_face()
    extrude(amount=F3_T78_DEPTH)

    split(bisect_by=Plane(origin=(-11.1732270906, 2.9703047545, 0), x_dir=(0, 0, 1), z_dir=(0.9664332505, -0.2569178318, 0)), keep=Keep.TOP)


with BuildPart() as f3_tool80:
    # F3_s81 → F3_t82 (new body)
    with BuildSketch(Plane(origin=(13.4212581193, 50.4859861874, 0), x_dir=(0, 0, 1), z_dir=(-0.2569178318, -0.9664332505, 0))):
        with BuildLine():
            ThreePointArc((3.5, 11.5613024332), (1.0251262658, 10.5361761674), (0, 8.0613024332))
            Line((0, 8.0613024332), (0, 11.5613024332))
            Line((0, 11.5613024332), (3.5, 11.5613024332))
        make_face()
    extrude(amount=F3_T82_DEPTH)

    split(bisect_by=Plane(origin=(-4.1039199091, 12.9550853833, 0), x_dir=(0, 0, 1), z_dir=(0.3019904306, -0.9533109565, 0)), keep=Keep.TOP)


with BuildPart() as f3_tool76_1:
    add(f3_tool76.part)

    # F3_t84: intersect F3_tool80
    add(f3_tool80.part, mode=Mode.INTERSECT)


with BuildPart() as f1_24:
    add(f1_23.part)

    # F3_t74: cut F3_tool76
    add(f3_tool76_1.part, mode=Mode.SUBTRACT)


solid = f1_24.part
